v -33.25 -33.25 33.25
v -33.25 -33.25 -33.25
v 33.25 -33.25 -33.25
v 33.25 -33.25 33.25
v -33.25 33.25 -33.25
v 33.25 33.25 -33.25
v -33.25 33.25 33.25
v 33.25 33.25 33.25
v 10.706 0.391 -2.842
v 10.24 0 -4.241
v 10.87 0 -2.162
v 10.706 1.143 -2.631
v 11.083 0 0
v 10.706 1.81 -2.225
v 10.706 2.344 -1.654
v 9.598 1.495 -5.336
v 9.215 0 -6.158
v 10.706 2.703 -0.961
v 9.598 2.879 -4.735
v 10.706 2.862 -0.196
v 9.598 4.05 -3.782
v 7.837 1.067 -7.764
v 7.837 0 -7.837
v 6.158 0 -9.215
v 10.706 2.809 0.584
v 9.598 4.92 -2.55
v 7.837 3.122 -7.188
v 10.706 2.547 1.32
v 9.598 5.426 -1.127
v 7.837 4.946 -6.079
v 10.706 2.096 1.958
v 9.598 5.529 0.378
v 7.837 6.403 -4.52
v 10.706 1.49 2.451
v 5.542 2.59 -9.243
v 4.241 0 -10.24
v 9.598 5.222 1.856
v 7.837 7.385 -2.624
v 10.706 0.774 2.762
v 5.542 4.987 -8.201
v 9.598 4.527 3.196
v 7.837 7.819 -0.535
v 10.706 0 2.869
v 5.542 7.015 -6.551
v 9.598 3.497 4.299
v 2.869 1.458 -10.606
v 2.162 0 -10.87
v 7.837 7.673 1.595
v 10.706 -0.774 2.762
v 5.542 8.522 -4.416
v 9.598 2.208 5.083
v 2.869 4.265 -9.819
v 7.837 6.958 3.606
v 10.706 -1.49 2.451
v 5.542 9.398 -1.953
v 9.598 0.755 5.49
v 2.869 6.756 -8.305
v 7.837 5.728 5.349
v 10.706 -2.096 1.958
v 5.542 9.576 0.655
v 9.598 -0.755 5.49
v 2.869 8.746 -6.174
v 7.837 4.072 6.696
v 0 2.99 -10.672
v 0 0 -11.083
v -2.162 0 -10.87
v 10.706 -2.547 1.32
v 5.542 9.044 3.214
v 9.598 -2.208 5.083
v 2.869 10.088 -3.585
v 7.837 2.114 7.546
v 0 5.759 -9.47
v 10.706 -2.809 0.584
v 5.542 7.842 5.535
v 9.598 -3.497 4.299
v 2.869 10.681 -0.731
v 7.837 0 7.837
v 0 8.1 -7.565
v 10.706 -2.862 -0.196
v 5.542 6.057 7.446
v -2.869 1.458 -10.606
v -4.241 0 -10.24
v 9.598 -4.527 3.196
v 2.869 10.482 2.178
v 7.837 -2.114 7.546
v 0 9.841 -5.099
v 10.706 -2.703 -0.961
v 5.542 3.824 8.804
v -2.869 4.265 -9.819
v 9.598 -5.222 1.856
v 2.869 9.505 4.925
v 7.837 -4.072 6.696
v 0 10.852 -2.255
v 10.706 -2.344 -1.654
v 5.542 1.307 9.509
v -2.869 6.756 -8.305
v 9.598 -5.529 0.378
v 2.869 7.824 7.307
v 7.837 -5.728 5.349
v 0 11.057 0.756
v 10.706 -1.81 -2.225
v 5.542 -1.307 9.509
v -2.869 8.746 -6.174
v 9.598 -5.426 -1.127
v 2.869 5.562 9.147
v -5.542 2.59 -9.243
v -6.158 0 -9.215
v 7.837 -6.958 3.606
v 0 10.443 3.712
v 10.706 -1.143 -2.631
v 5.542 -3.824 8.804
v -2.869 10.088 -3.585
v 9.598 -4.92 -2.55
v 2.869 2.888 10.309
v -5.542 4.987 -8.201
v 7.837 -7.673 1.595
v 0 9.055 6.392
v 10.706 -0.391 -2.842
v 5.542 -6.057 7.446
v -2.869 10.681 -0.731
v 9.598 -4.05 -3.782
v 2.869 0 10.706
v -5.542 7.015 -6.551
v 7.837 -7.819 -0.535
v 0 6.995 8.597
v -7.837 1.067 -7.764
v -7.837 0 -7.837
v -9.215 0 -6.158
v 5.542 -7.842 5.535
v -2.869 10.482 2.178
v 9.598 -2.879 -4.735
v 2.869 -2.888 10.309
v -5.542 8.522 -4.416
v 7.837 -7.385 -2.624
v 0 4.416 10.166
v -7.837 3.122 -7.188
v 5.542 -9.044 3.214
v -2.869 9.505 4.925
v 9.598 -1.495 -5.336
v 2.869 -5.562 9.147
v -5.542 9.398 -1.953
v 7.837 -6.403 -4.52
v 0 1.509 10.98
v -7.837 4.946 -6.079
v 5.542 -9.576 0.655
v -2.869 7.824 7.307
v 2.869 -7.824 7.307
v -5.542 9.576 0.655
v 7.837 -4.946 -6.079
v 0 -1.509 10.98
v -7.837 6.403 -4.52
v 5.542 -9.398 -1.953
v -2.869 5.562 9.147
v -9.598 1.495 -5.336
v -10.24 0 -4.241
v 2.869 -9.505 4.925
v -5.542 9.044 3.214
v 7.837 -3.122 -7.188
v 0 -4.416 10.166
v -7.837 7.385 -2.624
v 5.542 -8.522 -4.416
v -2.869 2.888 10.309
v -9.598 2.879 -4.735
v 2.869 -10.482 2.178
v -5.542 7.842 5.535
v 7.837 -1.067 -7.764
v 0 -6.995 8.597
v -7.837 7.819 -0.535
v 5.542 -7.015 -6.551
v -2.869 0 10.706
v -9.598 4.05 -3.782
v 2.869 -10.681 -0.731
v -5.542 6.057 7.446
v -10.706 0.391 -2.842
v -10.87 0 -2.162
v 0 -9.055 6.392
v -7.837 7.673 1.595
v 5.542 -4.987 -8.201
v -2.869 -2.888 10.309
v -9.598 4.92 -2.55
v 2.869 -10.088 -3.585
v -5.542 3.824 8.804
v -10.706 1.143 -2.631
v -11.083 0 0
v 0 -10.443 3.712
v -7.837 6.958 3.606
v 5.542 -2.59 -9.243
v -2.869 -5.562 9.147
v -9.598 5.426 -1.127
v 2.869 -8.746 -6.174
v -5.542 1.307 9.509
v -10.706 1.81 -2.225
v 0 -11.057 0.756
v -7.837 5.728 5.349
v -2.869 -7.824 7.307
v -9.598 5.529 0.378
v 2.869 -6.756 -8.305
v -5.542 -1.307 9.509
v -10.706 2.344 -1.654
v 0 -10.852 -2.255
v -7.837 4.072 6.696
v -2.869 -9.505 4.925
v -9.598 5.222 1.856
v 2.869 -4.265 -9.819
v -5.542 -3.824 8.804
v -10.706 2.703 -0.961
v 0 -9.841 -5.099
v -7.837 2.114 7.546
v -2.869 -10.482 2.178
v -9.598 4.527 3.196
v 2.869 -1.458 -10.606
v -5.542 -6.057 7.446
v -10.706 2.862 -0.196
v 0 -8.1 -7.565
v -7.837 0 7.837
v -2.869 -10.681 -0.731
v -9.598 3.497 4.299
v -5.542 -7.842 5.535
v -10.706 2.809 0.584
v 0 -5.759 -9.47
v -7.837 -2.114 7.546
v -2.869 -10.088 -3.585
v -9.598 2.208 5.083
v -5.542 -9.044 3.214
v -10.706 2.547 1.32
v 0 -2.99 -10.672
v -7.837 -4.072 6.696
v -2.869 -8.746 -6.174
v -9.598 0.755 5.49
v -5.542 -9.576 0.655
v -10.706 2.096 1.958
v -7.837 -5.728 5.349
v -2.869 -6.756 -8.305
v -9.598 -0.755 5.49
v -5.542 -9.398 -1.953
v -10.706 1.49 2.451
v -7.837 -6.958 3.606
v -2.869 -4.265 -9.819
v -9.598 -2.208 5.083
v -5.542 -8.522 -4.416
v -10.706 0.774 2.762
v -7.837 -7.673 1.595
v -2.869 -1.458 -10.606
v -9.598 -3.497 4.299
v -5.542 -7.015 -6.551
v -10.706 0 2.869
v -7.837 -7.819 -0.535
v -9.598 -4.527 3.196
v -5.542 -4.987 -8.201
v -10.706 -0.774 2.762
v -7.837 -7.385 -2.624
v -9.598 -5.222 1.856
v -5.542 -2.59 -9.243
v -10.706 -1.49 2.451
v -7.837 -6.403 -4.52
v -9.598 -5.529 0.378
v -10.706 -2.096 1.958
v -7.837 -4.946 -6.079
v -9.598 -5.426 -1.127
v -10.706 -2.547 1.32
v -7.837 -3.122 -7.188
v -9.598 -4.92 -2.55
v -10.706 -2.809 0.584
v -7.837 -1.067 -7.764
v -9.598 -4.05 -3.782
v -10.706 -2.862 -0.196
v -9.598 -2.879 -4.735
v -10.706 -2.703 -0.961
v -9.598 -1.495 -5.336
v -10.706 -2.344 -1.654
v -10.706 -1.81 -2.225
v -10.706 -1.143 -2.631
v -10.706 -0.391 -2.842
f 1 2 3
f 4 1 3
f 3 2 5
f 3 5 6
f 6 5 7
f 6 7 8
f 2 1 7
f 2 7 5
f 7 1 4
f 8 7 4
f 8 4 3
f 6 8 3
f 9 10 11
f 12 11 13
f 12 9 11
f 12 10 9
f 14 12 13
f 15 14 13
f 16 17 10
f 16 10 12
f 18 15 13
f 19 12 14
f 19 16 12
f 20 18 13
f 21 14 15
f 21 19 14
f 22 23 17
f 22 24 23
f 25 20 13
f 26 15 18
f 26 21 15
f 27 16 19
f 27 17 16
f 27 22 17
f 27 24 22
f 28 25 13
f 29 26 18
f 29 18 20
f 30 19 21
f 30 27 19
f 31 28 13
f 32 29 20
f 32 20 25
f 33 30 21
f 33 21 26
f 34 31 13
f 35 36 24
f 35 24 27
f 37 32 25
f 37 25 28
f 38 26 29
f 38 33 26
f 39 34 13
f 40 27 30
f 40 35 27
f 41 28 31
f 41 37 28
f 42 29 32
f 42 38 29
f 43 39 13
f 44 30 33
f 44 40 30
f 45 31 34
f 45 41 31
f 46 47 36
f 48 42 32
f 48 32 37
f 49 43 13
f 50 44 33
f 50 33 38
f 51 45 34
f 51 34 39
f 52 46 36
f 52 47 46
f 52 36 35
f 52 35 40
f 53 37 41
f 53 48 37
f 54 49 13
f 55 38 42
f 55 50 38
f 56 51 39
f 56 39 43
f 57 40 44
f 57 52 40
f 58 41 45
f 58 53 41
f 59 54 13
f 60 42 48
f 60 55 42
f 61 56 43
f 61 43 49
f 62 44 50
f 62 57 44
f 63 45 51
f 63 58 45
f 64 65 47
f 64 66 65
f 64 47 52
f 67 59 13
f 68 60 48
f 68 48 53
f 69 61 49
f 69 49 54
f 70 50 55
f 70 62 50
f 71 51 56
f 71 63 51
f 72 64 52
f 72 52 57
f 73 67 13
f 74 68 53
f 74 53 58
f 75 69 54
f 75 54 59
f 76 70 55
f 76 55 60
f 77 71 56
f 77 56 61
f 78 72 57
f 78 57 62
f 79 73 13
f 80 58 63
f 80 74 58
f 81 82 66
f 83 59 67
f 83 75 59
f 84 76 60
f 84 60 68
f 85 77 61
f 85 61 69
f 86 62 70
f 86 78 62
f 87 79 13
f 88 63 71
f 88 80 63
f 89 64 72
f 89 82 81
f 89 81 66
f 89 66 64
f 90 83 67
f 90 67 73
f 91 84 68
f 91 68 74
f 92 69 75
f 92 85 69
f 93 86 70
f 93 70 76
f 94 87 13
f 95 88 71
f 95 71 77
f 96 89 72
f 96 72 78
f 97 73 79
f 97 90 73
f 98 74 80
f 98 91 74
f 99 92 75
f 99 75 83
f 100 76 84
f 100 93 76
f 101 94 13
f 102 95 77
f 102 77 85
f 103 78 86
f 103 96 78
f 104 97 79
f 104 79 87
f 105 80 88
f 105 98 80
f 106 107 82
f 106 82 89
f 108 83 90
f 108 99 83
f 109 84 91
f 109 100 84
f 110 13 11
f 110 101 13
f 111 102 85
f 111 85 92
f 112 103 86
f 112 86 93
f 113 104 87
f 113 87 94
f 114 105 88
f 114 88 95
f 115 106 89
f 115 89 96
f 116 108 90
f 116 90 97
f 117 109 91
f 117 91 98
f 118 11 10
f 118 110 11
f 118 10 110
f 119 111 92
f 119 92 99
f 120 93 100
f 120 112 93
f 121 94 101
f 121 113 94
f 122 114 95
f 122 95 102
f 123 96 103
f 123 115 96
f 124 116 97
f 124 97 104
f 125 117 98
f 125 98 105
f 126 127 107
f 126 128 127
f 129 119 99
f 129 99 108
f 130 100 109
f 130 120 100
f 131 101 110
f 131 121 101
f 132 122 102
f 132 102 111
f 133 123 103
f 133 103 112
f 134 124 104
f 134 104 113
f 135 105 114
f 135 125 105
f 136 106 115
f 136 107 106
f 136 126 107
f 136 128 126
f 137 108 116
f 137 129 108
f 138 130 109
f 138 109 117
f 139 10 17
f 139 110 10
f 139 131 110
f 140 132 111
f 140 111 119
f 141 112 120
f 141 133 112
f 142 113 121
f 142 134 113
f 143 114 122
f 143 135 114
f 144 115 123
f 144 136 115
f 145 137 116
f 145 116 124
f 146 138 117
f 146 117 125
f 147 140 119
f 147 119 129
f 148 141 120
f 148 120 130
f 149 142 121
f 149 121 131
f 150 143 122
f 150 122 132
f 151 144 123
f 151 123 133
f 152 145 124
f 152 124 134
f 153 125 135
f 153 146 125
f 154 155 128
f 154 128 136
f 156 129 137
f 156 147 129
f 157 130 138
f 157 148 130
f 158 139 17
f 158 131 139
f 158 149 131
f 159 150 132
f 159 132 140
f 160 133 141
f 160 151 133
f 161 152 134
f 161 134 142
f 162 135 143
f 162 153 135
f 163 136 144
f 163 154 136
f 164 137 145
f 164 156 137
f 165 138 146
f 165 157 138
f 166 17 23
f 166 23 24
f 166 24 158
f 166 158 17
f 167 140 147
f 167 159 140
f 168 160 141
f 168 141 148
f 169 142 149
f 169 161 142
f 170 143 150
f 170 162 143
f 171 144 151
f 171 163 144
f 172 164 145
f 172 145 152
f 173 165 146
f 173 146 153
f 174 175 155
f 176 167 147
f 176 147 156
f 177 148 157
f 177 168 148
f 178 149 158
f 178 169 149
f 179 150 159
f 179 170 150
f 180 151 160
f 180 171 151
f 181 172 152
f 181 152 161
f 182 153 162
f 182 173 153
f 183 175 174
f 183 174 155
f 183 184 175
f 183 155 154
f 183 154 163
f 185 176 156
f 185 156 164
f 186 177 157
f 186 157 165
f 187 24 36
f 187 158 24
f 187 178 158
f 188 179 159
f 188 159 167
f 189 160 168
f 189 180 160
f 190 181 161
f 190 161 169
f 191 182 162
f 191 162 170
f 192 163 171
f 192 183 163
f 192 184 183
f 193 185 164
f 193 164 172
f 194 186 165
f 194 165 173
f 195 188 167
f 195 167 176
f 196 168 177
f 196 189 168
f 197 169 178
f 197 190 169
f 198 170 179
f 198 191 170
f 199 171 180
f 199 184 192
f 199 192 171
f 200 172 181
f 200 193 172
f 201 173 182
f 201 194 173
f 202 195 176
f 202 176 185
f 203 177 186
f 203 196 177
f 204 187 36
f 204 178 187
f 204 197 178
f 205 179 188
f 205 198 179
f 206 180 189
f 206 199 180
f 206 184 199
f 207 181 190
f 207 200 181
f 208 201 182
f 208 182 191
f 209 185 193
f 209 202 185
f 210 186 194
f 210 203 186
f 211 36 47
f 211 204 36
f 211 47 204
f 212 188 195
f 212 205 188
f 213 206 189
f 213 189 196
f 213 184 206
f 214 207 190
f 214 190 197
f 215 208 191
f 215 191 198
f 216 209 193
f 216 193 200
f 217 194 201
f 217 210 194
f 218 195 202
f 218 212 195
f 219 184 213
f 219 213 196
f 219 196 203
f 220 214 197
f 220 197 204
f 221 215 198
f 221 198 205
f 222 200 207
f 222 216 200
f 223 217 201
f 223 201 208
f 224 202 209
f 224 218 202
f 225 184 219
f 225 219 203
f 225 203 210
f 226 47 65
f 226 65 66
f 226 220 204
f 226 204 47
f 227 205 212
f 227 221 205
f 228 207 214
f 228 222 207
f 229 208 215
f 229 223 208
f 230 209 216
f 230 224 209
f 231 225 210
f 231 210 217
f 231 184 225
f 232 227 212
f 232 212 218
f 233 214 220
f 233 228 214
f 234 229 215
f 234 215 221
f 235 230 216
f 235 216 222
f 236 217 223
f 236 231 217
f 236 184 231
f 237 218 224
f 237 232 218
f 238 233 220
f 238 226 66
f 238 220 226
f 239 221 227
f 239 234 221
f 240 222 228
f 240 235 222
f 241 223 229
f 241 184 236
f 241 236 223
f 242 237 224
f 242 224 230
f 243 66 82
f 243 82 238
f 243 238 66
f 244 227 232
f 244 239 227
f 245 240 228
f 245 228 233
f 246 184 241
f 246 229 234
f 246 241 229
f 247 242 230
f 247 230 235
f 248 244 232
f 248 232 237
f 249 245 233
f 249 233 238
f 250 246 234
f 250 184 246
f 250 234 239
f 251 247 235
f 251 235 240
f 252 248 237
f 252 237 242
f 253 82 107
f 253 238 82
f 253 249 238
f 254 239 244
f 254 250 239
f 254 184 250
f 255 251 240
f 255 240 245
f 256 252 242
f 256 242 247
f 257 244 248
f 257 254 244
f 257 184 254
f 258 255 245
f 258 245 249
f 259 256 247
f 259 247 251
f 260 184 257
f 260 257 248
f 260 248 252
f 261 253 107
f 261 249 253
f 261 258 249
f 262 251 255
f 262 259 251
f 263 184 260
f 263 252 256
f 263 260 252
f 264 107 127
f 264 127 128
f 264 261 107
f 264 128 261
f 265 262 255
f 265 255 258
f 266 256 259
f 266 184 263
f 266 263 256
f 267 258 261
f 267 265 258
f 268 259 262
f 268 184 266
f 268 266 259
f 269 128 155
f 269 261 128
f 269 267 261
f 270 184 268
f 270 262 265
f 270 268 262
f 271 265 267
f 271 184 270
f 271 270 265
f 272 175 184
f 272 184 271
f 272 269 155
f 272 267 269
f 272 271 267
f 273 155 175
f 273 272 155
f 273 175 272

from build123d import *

# Parameters (mm, degrees)
BOSS_EXTRUDE1_DEPTH      = 33.25
BOSS_EXTRUDE1_DEPTH_BACK = 33.25
SKETCH1_W                = 66.5
SKETCH1_H                = 66.5


with BuildPart() as part:
    # Sketch1 → Boss-Extrude1 (new, two sides: drawn at the far end of the back side and taken through both)
    with BuildSketch(Plane(origin=(0, 0, 0), x_dir=(1, 0, 0), z_dir=(0, 1, 0)).offset(-BOSS_EXTRUDE1_DEPTH_BACK)):
        Rectangle(SKETCH1_W, SKETCH1_H)
    extrude(amount=BOSS_EXTRUDE1_DEPTH + BOSS_EXTRUDE1_DEPTH_BACK)

    # Sketch2 → Cut-Revolve1 (revolve, cut)
    with BuildSketch(Plane(origin=(0, 0, 0), x_dir=(1, 0, 0), z_dir=(0, 1, 0))):
        with BuildLine():
            Line((-11.083333333, 0), (11.083333333, 0))
            ThreePointArc((11.083333333, 0), (0, 11.083333333), (-11.083333333, 0))
        make_face()
    revolve(axis=Axis((-11.083333333, 0, 0), (1, 0, 0)), mode=Mode.SUBTRACT)


solid = part.part
